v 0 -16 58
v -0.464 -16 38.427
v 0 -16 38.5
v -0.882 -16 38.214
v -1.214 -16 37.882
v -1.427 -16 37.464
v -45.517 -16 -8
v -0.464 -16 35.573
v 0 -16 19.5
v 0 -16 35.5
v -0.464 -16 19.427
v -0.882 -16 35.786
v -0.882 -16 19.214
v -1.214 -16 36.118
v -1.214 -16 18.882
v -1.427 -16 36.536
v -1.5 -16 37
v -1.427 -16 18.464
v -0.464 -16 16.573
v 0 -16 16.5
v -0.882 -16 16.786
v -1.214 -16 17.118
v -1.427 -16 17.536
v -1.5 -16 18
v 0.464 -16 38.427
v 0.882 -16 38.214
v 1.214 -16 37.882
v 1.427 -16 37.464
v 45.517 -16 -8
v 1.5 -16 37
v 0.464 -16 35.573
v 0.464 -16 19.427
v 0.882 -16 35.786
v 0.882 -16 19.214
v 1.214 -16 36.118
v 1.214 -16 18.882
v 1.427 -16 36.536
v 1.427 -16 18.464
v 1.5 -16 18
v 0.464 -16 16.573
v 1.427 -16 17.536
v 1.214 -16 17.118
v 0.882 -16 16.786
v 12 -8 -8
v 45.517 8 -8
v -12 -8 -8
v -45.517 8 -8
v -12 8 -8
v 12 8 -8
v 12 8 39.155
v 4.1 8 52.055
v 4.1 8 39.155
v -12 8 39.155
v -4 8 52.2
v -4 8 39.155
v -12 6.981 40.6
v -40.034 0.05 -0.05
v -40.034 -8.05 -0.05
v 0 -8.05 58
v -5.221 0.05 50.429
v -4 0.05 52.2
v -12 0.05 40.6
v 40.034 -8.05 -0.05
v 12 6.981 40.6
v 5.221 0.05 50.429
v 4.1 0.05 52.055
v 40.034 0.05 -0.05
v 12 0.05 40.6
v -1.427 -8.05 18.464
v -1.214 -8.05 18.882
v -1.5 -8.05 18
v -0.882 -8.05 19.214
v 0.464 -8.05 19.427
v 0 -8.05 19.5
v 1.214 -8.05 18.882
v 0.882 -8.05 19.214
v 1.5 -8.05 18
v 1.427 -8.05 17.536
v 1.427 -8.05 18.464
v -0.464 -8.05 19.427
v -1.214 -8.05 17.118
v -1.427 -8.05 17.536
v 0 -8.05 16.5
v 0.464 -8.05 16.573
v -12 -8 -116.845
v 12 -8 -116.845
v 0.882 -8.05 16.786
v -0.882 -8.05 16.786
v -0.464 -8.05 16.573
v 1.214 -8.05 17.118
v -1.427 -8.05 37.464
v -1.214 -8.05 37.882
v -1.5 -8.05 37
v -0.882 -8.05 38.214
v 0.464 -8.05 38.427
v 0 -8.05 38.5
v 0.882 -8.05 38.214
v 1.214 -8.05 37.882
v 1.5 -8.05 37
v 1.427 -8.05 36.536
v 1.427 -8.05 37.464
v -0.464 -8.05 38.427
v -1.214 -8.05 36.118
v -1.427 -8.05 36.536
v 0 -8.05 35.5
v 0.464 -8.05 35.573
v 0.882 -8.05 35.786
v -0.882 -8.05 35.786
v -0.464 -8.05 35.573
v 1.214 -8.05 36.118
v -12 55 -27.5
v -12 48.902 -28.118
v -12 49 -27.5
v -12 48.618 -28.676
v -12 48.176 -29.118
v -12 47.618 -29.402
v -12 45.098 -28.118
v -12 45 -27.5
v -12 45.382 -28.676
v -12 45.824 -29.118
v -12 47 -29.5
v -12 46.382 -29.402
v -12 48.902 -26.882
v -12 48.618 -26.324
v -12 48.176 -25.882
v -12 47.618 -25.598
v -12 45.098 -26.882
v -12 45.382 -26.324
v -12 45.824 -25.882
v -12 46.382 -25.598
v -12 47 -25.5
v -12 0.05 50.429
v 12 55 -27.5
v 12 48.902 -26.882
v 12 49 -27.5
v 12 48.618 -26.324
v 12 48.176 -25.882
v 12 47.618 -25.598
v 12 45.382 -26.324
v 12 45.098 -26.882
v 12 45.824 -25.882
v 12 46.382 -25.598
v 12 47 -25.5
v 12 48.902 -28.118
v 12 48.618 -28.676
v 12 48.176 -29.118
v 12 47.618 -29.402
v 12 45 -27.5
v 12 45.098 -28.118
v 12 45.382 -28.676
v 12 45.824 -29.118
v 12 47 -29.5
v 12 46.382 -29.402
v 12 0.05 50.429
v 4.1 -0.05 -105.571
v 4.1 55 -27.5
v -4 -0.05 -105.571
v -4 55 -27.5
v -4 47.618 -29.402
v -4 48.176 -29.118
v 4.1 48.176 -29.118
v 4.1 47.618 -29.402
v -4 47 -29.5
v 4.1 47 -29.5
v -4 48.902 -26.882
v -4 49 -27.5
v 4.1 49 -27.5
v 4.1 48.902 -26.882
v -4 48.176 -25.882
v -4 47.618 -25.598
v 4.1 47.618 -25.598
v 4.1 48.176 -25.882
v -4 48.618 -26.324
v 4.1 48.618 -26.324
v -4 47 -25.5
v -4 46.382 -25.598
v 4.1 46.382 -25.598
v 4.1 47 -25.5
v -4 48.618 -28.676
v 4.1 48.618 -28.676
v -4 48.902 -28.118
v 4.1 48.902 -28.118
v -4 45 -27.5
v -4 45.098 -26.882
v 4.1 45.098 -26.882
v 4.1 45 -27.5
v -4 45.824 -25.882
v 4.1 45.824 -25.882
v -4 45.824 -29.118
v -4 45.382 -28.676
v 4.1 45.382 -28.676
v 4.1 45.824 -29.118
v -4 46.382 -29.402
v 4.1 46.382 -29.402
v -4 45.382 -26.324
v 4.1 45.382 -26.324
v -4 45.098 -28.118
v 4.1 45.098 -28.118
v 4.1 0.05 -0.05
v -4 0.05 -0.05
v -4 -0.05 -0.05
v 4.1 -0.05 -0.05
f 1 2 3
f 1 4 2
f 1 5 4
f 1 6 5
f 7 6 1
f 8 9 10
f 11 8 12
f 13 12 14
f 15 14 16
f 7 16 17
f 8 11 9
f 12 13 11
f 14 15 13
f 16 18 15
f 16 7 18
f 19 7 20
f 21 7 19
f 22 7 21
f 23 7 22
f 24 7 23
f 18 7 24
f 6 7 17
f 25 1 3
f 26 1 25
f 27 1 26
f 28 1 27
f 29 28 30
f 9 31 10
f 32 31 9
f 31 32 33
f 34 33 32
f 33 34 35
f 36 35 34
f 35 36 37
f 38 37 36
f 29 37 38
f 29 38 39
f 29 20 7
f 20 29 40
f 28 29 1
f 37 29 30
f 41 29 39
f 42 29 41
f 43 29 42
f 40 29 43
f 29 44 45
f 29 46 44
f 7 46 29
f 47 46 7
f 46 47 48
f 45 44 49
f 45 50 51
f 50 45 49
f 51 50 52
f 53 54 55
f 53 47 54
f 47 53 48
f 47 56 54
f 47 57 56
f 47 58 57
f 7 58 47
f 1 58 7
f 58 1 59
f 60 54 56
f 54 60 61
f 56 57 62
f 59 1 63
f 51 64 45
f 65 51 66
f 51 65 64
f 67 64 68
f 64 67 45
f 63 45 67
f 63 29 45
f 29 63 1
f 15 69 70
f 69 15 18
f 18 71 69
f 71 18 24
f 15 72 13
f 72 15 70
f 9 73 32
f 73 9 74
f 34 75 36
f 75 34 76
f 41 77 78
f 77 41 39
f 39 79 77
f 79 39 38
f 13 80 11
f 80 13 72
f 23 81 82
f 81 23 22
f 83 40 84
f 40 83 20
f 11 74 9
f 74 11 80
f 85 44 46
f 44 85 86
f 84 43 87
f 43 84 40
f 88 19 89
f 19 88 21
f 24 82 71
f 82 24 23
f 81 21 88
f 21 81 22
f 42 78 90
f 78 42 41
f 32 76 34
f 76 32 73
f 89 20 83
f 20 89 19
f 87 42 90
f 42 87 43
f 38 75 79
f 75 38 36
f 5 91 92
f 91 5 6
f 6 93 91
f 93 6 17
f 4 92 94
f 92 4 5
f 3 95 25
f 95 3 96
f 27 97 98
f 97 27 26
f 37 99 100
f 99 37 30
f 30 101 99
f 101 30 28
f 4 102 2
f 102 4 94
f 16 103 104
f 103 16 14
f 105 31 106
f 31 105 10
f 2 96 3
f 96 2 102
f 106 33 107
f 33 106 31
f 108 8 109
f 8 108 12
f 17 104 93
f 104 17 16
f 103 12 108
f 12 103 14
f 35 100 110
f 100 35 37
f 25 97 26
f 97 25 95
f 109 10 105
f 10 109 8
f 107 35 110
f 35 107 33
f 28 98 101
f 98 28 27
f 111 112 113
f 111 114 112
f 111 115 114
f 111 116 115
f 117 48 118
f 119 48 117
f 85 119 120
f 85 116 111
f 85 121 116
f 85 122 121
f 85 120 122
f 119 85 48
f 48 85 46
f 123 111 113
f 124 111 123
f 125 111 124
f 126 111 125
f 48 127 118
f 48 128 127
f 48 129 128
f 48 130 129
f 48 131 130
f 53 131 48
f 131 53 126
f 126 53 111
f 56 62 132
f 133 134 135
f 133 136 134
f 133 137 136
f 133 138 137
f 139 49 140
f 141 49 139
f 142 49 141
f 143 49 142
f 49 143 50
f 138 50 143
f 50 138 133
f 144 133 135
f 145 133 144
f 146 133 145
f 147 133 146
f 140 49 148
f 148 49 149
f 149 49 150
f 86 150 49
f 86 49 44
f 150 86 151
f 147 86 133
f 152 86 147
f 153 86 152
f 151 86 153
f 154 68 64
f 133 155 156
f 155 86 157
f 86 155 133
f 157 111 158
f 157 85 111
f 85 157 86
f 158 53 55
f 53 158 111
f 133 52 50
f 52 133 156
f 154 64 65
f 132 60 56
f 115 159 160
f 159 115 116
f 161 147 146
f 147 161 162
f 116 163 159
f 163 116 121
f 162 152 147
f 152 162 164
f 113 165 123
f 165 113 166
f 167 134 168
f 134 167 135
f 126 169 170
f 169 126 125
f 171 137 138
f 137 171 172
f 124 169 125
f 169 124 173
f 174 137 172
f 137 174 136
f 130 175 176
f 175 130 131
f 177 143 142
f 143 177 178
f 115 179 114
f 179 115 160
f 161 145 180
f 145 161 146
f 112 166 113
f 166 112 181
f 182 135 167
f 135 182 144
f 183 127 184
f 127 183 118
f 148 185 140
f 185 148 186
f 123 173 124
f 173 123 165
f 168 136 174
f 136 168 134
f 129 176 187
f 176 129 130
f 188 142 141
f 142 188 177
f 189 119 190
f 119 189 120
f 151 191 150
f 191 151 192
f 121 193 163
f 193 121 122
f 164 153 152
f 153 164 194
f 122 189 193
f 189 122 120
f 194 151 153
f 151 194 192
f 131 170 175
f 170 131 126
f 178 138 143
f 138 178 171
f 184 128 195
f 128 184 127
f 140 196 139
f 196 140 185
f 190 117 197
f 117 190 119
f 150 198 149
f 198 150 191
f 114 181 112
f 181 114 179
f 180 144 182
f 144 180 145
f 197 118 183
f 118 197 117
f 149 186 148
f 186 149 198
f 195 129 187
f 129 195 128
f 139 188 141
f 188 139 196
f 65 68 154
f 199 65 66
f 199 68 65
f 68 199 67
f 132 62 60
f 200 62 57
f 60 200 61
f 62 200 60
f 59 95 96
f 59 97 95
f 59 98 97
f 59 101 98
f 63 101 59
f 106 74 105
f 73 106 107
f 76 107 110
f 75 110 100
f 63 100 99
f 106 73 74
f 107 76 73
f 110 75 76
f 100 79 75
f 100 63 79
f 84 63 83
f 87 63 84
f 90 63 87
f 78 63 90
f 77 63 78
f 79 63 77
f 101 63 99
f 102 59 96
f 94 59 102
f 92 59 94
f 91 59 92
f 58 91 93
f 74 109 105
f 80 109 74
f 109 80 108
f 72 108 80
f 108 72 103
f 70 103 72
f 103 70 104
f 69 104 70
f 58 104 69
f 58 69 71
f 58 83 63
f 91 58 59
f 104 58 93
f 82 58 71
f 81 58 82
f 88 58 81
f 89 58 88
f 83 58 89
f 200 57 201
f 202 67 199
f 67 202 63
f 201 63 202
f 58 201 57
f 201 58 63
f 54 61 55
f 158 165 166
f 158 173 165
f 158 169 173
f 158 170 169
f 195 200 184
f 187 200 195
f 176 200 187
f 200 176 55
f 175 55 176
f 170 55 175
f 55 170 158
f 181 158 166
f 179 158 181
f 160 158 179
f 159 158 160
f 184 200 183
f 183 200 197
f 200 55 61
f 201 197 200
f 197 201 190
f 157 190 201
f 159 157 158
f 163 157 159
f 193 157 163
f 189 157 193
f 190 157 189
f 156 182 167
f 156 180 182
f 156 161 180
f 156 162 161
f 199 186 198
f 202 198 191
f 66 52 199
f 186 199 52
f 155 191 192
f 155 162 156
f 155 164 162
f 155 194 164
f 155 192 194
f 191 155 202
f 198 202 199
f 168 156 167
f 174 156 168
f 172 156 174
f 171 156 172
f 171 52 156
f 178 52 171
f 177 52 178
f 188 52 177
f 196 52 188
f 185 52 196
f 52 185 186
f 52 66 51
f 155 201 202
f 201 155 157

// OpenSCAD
wallThickness=8.0;         // thickness of brace walls. 
frameThickness=8.0;        // thickness of anet a8 frame.
frontTriangleHeight=58.0;
frontTriangleWidth=80.0;
sideTriangleHeight=55.0;
sideTriangleWidth=156.0;
sideTriangleOffset=27.5;  // offset from zero. zero is where horizontal ad vertical frame parts meet ( see axis cross here in openscad!.  -|-
frontScrewsDia=3.0;
sideScrewsDia=4.0;
screw1Distance=18.0;
screw2Distance=37.0;
screw3Distance=47.0;

gap=0.1;       // tiny amount of "play" in order to be able to put in corner brace more easily.

// sin(α)=Gegenkathete/Hypotenuse;
alpha = asin( frontTriangleHeight / sqrt( pow(frontTriangleWidth/2,2) + pow(frontTriangleHeight,2) ) );
echo("alpha: ", alpha);
// cos(α)=Ankathete/Hypotenuse     => Ankathete = cos(α)*Hypotenuse => Hypotenuse = Ankathete/cos(α)*
// tan(α)=Gegenkathete/Ankathete   => Ankathete = GegenKathete/tan(α)
// Gegenkathete = wallThickness
// gesucht ist Ankathete
ankathete01 = wallThickness / tan(alpha); 
echo("ankathete01: ", ankathete01);
// side triangle
beta = asin( sideTriangleHeight / sqrt( pow(sideTriangleWidth/2,2) + pow(sideTriangleHeight,2) ) );
echo("beta: ", beta);
ankathete02 = wallThickness / tan(beta); 
echo("ankathete02: ", ankathete02);

///////////////////////////////////////////////////////////////////////////////
rotate([90,0,180])
difference()
{
    union()
    {
        // front triangle
        translate([0,-wallThickness,-wallThickness-frameThickness])
        difference()
        {
            linear_extrude(height=2*wallThickness+frameThickness, center=false)
            polygon(points=[ [(-frontTriangleWidth/2)-ankathete01, 0], 
                             [(frontTriangleWidth/2)+ankathete01, 0], 
                             [0, frontTriangleHeight+wallThickness] ]);
            // cut out hole for first screw on front
            translate([0, wallThickness+screw1Distance, -frameThickness/2])
            cylinder($fn=20, (wallThickness+frameThickness/2), r=frontScrewsDia/2);
            // cut out hole for second screw on front
            translate([0, screw2Distance+wallThickness, -frameThickness/2])
            cylinder($fn=20, (wallThickness+frameThickness/2), r=frontScrewsDia/2);           
        }
   
        // side triangle
        translate([wallThickness+frameThickness/2, -sideTriangleOffset,-wallThickness])
        rotate([90,0,-90])
        difference()
        {
            linear_extrude(height=2*wallThickness+frameThickness, center=false)
            polygon(points=[ [(-sideTriangleWidth/2)-ankathete02, 0], 
                             [(sideTriangleWidth/2)+ankathete02, 0], 
                             [0, sideTriangleHeight+wallThickness] ]);
             // cut out hole for left side screw
            translate([0, screw3Distance+wallThickness, -10])
            cylinder($fn=20, (2*wallThickness+frameThickness+20), r=sideScrewsDia/2);
        }
    }

//// cut out front triangle.
translate([-frontTriangleWidth/2-10, -gap/2, -wallThickness-gap/2])   // x,z,y
cube(size = [frontTriangleWidth+20, frontTriangleHeight+20, frameThickness+gap]);

////// cut out junction between front and side triangle.
translate([-frameThickness/2-gap, -gap/2, 0])  // x,z,y
    cube(size = [frameThickness+gap, frontTriangleHeight+10, wallThickness]);   //   x,z,y

//// cut out side triangle.
rotate([90,0,-90])
translate([-frontTriangleHeight-10, -gap/2, -wallThickness+frameThickness/2])  // z,y,x
    cube(size = [sideTriangleWidth+20, sideTriangleHeight+20, frameThickness+gap]);
}
